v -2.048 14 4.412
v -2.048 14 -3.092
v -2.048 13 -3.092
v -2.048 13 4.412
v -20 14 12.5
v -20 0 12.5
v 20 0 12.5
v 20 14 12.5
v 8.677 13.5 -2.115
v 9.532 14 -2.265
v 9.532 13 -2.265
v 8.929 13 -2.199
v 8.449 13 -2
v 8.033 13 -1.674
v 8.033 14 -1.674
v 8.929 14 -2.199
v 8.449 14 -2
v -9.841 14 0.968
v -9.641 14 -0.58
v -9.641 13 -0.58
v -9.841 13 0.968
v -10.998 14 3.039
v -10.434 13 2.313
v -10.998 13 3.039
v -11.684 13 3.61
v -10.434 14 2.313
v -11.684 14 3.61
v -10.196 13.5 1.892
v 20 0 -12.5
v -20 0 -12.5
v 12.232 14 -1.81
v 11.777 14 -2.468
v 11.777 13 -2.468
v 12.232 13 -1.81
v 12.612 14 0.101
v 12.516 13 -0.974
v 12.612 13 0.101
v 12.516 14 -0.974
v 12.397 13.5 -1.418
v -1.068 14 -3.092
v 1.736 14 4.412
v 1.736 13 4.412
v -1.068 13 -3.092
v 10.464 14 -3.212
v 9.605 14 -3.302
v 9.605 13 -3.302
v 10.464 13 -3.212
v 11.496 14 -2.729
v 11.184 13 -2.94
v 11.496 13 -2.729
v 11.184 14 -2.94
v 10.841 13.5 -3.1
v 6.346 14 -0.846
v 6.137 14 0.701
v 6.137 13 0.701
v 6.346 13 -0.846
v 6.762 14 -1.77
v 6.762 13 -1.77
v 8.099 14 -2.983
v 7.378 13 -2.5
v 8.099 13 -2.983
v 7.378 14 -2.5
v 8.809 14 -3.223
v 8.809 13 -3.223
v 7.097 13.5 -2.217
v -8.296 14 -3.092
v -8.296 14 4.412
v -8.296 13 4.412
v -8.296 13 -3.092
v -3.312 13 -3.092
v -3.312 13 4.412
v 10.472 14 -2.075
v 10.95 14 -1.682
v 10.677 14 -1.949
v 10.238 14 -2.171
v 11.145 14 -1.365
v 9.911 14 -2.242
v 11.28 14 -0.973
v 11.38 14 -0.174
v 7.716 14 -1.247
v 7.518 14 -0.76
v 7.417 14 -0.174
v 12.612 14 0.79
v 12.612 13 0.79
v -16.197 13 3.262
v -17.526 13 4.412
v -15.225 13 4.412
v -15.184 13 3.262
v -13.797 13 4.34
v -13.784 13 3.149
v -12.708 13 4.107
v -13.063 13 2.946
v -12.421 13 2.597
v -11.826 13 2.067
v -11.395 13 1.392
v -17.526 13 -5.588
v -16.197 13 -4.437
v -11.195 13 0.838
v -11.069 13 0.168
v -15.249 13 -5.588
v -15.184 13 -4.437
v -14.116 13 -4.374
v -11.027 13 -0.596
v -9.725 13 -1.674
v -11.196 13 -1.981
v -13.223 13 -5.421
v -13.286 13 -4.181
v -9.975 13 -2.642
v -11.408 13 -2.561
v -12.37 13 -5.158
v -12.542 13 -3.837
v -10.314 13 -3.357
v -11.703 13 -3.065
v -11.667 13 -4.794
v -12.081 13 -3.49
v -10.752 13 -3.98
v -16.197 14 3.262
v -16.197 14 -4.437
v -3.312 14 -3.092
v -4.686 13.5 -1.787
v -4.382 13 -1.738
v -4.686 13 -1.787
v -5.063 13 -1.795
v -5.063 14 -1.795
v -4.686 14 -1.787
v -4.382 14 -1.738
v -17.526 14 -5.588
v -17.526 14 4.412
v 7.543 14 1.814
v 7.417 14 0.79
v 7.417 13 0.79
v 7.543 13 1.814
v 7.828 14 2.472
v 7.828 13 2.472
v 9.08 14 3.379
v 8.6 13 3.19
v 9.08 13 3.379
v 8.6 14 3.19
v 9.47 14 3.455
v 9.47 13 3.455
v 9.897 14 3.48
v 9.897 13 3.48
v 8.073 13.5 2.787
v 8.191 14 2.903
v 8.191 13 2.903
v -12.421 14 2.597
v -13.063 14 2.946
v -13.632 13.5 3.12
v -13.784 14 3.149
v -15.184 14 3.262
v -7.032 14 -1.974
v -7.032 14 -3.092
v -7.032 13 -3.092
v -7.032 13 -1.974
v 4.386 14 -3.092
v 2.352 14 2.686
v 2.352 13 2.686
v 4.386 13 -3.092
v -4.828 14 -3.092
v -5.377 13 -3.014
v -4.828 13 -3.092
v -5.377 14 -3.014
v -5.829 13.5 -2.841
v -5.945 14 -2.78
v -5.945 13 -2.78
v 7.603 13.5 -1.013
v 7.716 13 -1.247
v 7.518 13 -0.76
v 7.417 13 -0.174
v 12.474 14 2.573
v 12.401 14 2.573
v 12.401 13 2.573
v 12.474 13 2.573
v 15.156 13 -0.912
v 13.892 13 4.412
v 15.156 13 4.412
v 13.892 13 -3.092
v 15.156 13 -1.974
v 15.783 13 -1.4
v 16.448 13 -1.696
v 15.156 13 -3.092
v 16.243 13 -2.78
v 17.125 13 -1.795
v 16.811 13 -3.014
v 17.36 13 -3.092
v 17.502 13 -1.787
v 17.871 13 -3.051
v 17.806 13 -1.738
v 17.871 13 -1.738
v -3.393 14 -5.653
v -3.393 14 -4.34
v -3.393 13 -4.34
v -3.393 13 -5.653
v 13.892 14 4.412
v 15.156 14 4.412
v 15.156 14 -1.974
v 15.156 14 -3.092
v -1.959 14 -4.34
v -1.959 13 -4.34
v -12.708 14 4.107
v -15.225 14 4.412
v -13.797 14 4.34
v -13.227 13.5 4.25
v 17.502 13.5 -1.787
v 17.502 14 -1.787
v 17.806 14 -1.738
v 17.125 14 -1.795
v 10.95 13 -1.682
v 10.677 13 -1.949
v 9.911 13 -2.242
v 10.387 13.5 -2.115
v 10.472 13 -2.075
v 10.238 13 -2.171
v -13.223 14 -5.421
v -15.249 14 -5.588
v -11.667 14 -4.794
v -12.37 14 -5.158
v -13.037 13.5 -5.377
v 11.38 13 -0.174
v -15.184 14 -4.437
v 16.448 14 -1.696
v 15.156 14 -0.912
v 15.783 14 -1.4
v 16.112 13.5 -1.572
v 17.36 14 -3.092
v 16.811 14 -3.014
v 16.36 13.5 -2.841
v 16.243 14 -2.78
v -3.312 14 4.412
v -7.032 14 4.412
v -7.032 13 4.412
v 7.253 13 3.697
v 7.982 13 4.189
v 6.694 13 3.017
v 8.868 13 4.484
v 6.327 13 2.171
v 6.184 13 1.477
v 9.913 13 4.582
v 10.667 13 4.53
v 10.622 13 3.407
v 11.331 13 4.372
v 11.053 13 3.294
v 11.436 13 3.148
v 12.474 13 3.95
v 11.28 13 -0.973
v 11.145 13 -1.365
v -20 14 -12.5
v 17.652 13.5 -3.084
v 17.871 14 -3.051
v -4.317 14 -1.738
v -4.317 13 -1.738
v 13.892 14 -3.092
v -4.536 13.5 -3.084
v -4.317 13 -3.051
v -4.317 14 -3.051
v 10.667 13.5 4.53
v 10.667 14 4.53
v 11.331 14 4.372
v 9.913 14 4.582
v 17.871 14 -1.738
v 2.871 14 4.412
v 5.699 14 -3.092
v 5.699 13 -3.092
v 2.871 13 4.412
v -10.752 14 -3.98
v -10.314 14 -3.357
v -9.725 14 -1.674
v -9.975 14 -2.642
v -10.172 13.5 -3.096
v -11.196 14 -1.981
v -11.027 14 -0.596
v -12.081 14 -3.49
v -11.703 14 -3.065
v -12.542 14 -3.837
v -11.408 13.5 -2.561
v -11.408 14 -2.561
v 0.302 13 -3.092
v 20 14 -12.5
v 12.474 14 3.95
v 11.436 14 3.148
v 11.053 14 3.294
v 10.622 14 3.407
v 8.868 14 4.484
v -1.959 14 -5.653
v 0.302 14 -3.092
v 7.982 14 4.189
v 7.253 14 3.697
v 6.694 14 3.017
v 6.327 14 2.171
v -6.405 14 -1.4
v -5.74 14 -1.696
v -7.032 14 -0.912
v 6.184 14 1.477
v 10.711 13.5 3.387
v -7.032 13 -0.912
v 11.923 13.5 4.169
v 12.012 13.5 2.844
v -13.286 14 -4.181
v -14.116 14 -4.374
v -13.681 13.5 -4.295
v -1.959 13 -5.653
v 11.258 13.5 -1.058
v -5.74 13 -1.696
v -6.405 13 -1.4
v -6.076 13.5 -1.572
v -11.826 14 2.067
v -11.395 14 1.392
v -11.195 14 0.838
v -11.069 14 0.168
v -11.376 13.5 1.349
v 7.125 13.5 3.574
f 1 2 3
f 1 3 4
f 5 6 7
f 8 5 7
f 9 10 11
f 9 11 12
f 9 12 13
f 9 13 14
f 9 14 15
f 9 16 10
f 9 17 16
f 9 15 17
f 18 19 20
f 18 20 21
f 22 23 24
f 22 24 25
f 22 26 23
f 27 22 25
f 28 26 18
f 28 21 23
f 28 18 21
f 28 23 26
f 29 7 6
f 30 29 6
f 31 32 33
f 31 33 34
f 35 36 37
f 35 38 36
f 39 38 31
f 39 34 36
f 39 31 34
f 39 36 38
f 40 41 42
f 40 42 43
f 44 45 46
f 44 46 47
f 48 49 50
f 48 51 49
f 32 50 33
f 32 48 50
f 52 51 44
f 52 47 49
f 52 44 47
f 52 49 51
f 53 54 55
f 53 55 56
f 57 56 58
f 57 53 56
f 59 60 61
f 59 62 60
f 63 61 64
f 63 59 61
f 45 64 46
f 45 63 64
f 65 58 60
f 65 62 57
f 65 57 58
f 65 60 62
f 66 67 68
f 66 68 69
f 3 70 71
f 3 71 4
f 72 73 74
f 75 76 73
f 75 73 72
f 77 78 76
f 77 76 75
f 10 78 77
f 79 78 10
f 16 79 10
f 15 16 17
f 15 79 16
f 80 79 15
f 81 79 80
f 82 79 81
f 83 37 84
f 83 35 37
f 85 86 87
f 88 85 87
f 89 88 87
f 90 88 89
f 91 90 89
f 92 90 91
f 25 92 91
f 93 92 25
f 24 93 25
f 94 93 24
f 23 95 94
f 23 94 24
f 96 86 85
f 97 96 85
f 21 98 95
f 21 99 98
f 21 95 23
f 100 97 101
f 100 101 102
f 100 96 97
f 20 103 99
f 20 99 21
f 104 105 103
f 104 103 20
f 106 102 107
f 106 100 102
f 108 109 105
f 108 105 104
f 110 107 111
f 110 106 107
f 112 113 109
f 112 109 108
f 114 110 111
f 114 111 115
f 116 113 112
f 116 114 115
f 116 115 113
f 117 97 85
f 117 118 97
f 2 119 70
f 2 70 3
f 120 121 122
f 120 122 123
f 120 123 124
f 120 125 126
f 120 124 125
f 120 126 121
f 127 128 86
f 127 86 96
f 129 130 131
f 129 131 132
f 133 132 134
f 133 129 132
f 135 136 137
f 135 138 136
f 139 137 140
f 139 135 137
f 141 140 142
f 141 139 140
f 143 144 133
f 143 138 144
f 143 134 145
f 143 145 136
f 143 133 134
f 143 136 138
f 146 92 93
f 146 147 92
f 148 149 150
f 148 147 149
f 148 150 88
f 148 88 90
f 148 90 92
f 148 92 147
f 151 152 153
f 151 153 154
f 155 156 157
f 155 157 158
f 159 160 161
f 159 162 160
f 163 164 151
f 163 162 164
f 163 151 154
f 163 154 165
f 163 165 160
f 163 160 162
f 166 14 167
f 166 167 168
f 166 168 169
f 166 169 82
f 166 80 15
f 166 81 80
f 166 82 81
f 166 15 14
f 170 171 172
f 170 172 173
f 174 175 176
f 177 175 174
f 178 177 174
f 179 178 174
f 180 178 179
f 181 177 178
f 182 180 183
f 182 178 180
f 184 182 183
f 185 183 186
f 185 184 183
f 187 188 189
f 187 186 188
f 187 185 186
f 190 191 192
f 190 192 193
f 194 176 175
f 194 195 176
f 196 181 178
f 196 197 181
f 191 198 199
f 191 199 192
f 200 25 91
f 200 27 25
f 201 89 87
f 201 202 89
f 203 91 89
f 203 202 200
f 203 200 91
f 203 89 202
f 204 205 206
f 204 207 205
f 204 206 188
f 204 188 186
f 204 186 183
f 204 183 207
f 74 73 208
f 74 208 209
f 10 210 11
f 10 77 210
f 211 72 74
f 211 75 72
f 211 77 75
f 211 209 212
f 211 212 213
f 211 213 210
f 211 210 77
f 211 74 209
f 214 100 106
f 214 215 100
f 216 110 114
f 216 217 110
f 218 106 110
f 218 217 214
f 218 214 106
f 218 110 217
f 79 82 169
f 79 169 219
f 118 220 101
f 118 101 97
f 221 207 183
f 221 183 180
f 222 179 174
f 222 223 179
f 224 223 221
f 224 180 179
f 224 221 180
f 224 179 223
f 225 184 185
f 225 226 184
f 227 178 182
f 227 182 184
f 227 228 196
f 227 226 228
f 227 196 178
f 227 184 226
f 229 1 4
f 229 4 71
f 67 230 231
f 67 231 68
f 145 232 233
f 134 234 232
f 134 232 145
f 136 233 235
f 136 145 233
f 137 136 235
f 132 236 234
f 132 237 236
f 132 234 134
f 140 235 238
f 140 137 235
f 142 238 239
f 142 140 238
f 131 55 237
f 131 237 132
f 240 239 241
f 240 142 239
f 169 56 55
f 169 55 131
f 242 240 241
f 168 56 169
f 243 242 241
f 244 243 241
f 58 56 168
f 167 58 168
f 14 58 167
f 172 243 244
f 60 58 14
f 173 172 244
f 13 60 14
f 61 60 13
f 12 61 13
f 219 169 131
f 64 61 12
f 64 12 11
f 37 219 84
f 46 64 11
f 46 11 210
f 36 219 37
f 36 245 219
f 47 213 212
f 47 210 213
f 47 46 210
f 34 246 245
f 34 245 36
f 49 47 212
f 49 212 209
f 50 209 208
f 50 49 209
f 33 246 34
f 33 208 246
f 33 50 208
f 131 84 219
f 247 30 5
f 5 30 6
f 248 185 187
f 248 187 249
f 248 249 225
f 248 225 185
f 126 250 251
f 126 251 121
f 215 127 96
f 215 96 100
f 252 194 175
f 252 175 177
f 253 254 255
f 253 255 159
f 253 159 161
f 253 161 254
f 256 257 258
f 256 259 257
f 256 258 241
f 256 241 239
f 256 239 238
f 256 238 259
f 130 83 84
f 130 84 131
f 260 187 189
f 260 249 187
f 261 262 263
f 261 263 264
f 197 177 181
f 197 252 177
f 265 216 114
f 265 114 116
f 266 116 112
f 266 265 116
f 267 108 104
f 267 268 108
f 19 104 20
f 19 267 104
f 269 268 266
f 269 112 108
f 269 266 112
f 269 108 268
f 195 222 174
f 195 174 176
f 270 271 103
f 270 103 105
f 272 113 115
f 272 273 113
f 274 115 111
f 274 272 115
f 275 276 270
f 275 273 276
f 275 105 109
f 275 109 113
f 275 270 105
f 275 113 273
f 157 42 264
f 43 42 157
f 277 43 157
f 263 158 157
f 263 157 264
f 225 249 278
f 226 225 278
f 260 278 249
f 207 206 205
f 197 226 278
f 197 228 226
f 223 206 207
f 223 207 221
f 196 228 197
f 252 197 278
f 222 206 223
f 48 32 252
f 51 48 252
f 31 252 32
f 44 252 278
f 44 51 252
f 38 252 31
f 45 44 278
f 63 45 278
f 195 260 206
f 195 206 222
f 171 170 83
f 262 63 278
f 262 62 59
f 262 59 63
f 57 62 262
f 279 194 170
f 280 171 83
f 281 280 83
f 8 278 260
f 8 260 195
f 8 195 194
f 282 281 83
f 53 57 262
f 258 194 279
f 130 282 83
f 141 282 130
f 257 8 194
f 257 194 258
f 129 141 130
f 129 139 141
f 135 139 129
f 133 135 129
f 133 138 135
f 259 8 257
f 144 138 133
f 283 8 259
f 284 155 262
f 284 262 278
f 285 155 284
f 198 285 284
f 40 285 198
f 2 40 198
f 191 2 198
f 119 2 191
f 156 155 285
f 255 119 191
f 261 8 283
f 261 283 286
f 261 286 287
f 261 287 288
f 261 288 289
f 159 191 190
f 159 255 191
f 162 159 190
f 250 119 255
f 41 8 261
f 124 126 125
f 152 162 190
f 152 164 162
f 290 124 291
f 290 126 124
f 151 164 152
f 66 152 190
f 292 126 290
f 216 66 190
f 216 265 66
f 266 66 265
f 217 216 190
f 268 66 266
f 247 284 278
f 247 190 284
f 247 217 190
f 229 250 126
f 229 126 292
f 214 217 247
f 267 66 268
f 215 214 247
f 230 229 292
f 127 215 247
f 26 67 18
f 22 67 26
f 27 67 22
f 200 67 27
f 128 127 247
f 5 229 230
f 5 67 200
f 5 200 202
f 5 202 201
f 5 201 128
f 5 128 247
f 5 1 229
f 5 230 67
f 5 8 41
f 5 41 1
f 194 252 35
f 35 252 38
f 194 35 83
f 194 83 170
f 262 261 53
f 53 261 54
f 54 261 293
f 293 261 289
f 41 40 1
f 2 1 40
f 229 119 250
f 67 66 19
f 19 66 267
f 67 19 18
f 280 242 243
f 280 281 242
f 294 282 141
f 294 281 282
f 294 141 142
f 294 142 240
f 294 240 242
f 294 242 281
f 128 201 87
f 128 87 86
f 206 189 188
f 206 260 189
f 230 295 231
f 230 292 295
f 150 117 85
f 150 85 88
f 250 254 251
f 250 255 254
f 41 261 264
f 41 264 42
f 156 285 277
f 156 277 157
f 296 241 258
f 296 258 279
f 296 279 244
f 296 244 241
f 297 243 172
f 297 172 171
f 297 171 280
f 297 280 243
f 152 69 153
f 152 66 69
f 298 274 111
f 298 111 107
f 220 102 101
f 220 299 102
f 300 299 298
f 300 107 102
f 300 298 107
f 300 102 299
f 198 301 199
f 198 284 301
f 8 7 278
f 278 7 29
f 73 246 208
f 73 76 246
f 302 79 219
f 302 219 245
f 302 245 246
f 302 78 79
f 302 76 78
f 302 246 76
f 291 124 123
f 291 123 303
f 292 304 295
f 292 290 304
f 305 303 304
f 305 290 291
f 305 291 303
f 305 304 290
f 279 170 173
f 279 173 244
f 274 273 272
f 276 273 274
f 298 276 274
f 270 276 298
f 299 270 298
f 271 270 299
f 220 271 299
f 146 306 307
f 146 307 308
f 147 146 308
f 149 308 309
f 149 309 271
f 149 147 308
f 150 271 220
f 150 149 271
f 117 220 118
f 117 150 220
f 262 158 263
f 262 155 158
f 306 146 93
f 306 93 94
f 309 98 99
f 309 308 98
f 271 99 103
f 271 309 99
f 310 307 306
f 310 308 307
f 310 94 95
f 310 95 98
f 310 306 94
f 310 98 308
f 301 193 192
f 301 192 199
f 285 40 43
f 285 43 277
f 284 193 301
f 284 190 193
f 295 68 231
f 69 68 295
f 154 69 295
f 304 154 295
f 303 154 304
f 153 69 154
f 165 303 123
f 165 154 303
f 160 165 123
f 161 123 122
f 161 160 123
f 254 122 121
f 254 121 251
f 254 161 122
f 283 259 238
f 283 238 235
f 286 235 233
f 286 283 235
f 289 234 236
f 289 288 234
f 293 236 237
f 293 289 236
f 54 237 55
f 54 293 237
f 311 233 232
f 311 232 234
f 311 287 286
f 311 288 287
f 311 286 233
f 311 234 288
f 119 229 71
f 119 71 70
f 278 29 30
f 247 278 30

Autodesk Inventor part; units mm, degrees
ref_plane "YZ Plane" through (0, 0, 0) normal (1, 0, 0) x (0, 1, 0)
ref_plane "XZ Plane" through (0, 0, 0) normal (0, 1, 0) x (-1, 0, 0)
ref_plane "XY Plane" through (0, 0, 0) normal (0, 0, 1) x (1, 0, 0)
sketch "Sketch1" plane through (0, 0, 0) normal (0, 1, 0) x (-1, 0, 0)
  line L0 (20, 12.5) -> (-20, 12.5)
  line L1 (-20, 12.5) -> (-20, -12.5)
  line L2 (-20, -12.5) -> (20, -12.5)
  line L3 (20, -12.5) -> (20, 12.5)
  line L4 (20, 12.5) -> (-20, -12.5) construction
  line L5 (-20, 12.5) -> (20, -12.5) construction
  point P0 (0, 0)
  dimension "d0" = 40
  dimension "d1" = 25
extrude "Extrusion1" add sketch "Sketch1" along normal blind 14
sketch "Sketch2" plane through (0, 14, 0) normal (0, 1, 0) x (1, 0, 0)
  line L0 (-18.5392, 5.6526) -> (18.5392, 5.6526) construction
  line L1 (18.5392, 5.6526) -> (18.5392, -5.6526) construction
  line L2 (18.5392, -5.6526) -> (-18.5392, -5.6526) construction
  line L3 (-18.5392, -5.6526) -> (-18.5392, 5.6526) construction
  line L4 (20, -12.5) -> (20, 12.5) projected
  line L5 (20, 12.5) -> (-20, 12.5) projected
  line L6 (-20, 12.5) -> (-20, -12.5) projected
  line L7 (-20, -12.5) -> (20, -12.5) projected
  spline S0 degree 2 poles (-9.6413, 0.5796) (-9.6413, -0.7899) (-10.7516, -2.9941) (-11.6835, -3.61) knots 0 0 0 1 2 2 2
  spline S1 degree 2 poles (-11.6835, -3.61) (-12.4452, -4.0881) (-14.0093, -4.4123) (-15.2248, -4.4123) knots 0 0 0 1 2 2 2
  line L8 (-15.2248, -4.4123) -> (-17.5263, -4.4123)
  line L9 (-17.5263, -4.4123) -> (-17.5263, 5.5877)
  line L10 (-17.5263, 5.5877) -> (-15.2491, 5.5877)
  spline S2 degree 2 poles (-15.2491, 5.5877) (-13.8391, 5.5877) (-12.2345, 5.1663) (-11.6673, 4.7936) knots 0 0 0 1 2 2 2
  spline S3 degree 2 poles (-11.6673, 4.7936) (-10.7029, 4.1534) (-9.6413, 2.0383) (-9.6413, 0.5796) knots 0 0 0 1 2 2 2
  spline S4 degree 2 poles (-11.0271, 0.5958) (-11.0271, 1.7466) (-11.7888, 3.3754) (-12.5425, 3.8373) knots 0 0 0 1 2 2 2
  spline S5 degree 2 poles (-12.5425, 3.8373) (-13.0773, 4.1534) (-14.2848, 4.437) (-15.1843, 4.437) knots 0 0 0 1 2 2 2
  line L11 (-15.1843, 4.437) -> (-16.1973, 4.437)
  line L12 (-16.1973, 4.437) -> (-16.1973, -3.2615)
  line L13 (-16.1973, -3.2615) -> (-15.1843, -3.2615)
  spline S6 degree 2 poles (-15.1843, -3.2615) (-14.301, -3.2615) (-12.9639, -2.9779) (-12.4209, -2.597) knots 0 0 0 1 2 2 2
  spline S7 degree 2 poles (-12.4209, -2.597) (-11.724, -2.127) (-11.0271, -0.5711) (-11.0271, 0.5958) knots 0 0 0 1 2 2 2
  line L14 (-4.3172, 1.7385) -> (-4.382, 1.7385)
  spline S8 degree 2 poles (-4.382, 1.7385) (-4.5279, 1.779) (-4.8439, 1.7952) (-5.0627, 1.7952) knots 0 0 0 1 2 2 2
  spline S9 degree 2 poles (-5.0627, 1.7952) (-5.5733, 1.7952) (-6.5781, 1.3495) (-7.0319, 0.9119) knots 0 0 0 1 2 2 2
  line L15 (-7.0319, 0.9119) -> (-7.0319, -4.4123)
  line L16 (-7.0319, -4.4123) -> (-8.2961, -4.4123)
  line L17 (-8.2961, -4.4123) -> (-8.2961, 3.0918)
  line L18 (-8.2961, 3.0918) -> (-7.0319, 3.0918)
  line L19 (-7.0319, 3.0918) -> (-7.0319, 1.9735)
  spline S10 degree 2 poles (-7.0319, 1.9735) (-6.3431, 2.5894) (-5.314, 3.0918) (-4.8277, 3.0918) knots 0 0 0 1 2 2 2
  spline S11 degree 2 poles (-4.8277, 3.0918) (-4.6332, 3.0918) (-4.4387, 3.0756) (-4.3172, 3.0513) knots 0 0 0 1 2 2 2
  line L20 (-4.3172, 3.0513) -> (-4.3172, 1.7385)
  line L21 (-2.0481, -4.4123) -> (-3.3123, -4.4123)
  line L22 (-3.3123, -4.4123) -> (-3.3123, 3.0918)
  line L23 (-3.3123, 3.0918) -> (-2.0481, 3.0918)
  line L24 (-2.0481, 3.0918) -> (-2.0481, -4.4123)
  line L25 (-1.959, 4.3398) -> (-3.3934, 4.3398)
  line L26 (-3.3934, 4.3398) -> (-3.3934, 5.6526)
  line L27 (-3.3934, 5.6526) -> (-1.959, 5.6526)
  line L28 (-1.959, 5.6526) -> (-1.959, 4.3398)
  line L29 (5.699, 3.0918) -> (2.8708, -4.4123)
  line L30 (2.8708, -4.4123) -> (1.7363, -4.4123)
  line L31 (1.7363, -4.4123) -> (-1.0676, 3.0918)
  line L32 (-1.0676, 3.0918) -> (0.3019, 3.0918)
  line L33 (0.3019, 3.0918) -> (2.3522, -2.6862)
  line L34 (2.3522, -2.6862) -> (4.3862, 3.0918)
  line L35 (4.3862, 3.0918) -> (5.699, 3.0918)
  spline S12 degree 2 poles (9.913, -4.5824) (8.1139, -4.5824) (6.1366, -2.5646) (6.1366, -0.7008) knots 0 0 0 1 2 2 2
  spline S13 degree 2 poles (6.1366, -0.7008) (6.1366, 1.1307) (8.0572, 3.3025) (9.605, 3.3025) knots 0 0 0 1 2 2 2
  spline S14 degree 2 poles (9.605, 3.3025) (10.3019, 3.3025) (11.3797, 2.8973) (11.7768, 2.4678) knots 0 0 0 1 2 2 2
  spline S15 degree 2 poles (11.7768, 2.4678) (12.182, 2.0383) (12.6115, 0.7984) (12.6115, -0.1011) knots 0 0 0 1 2 2 2
  line L36 (12.6115, -0.1011) -> (12.6115, -0.7899)
  line L37 (12.6115, -0.7899) -> (7.417, -0.7899)
  spline S16 degree 2 poles (7.417, -0.7899) (7.417, -2.0946) (8.7298, -3.4803) (9.8967, -3.4803) knots 0 0 0 1 2 2 2
  spline S17 degree 2 poles (9.8967, -3.4803) (10.31, -3.4803) (11.1123, -3.294) (11.4365, -3.1481) knots 0 0 0 1 2 2 2
  spline S18 degree 2 poles (11.4365, -3.1481) (11.7768, -2.986) (12.2468, -2.7024) (12.4008, -2.5727) knots 0 0 0 1 2 2 2
  line L38 (12.4008, -2.5727) -> (12.4737, -2.5727)
  line L39 (12.4737, -2.5727) -> (12.4737, -3.9504)
  spline S19 degree 2 poles (12.4737, -3.9504) (12.2549, -4.0395) (11.5904, -4.2988) (11.3311, -4.3717) knots 0 0 0 1 2 2 2
  spline S20 degree 2 poles (11.3311, -4.3717) (10.9664, -4.4771) (10.3668, -4.5824) (9.913, -4.5824) knots 0 0 0 1 2 2 2
  spline S21 degree 2 poles (11.3797, 0.1744) (11.3635, 0.685) (11.1528, 1.4305) (10.9502, 1.6817) knots 0 0 0 1 2 2 2
  spline S22 degree 2 poles (10.9502, 1.6817) (10.7314, 1.9654) (10.0426, 2.2652) (9.5321, 2.2652) knots 0 0 0 1 2 2 2
  spline S23 degree 2 poles (9.5321, 2.2652) (9.0296, 2.2652) (8.3246, 1.9654) (8.0329, 1.6736) knots 0 0 0 1 2 2 2
  spline S24 degree 2 poles (8.0329, 1.6736) (7.7493, 1.3738) (7.4575, 0.6526) (7.417, 0.1744) knots 0 0 0 1 2 2 2
  line L40 (7.417, 0.1744) -> (11.3797, 0.1744)
  line L41 (17.8708, 1.7385) -> (17.806, 1.7385)
  spline S25 degree 2 poles (17.806, 1.7385) (17.6601, 1.779) (17.3441, 1.7952) (17.1253, 1.7952) knots 0 0 0 1 2 2 2
  spline S26 degree 2 poles (17.1253, 1.7952) (16.6147, 1.7952) (15.6099, 1.3495) (15.1561, 0.9119) knots 0 0 0 1 2 2 2
  line L42 (15.1561, 0.9119) -> (15.1561, -4.4123)
  line L43 (15.1561, -4.4123) -> (13.8919, -4.4123)
  line L44 (13.8919, -4.4123) -> (13.8919, 3.0918)
  line L45 (13.8919, 3.0918) -> (15.1561, 3.0918)
  line L46 (15.1561, 3.0918) -> (15.1561, 1.9735)
  spline S27 degree 2 poles (15.1561, 1.9735) (15.8449, 2.5894) (16.8741, 3.0918) (17.3603, 3.0918) knots 0 0 0 1 2 2 2
  spline S28 degree 2 poles (17.3603, 3.0918) (17.5548, 3.0918) (17.7493, 3.0756) (17.8708, 3.0513) knots 0 0 0 1 2 2 2
  line L47 (17.8708, 3.0513) -> (17.8708, 1.7385)
  point P0 (0, 0)
  point P1 (-18.5392, 0)
  point P2 (-20, 0)
  point P3 (0, 5.6526)
  point P4 (0, 12.5)
extrude "Extrusion2" cut sketch "Sketch2" against normal blind 1 contours S0 S1 L8 L9 L10 S2 S3 | L14 S8 S9 L15 L16 L17 L18 L19 S10 S11 L20 | L21 L22 L23 L24 | L25 L26 L27 L28 | L29 L30 L31 L32 L33 L34 L35 | S12 S13 S14 S15 L36 L37 S16 S17 S18 L38 L39 S19 S20 | L41 S25 S26 L42 L43 L44 L45 L46 S27 S28 L47
properties part number "Motor Driver"
